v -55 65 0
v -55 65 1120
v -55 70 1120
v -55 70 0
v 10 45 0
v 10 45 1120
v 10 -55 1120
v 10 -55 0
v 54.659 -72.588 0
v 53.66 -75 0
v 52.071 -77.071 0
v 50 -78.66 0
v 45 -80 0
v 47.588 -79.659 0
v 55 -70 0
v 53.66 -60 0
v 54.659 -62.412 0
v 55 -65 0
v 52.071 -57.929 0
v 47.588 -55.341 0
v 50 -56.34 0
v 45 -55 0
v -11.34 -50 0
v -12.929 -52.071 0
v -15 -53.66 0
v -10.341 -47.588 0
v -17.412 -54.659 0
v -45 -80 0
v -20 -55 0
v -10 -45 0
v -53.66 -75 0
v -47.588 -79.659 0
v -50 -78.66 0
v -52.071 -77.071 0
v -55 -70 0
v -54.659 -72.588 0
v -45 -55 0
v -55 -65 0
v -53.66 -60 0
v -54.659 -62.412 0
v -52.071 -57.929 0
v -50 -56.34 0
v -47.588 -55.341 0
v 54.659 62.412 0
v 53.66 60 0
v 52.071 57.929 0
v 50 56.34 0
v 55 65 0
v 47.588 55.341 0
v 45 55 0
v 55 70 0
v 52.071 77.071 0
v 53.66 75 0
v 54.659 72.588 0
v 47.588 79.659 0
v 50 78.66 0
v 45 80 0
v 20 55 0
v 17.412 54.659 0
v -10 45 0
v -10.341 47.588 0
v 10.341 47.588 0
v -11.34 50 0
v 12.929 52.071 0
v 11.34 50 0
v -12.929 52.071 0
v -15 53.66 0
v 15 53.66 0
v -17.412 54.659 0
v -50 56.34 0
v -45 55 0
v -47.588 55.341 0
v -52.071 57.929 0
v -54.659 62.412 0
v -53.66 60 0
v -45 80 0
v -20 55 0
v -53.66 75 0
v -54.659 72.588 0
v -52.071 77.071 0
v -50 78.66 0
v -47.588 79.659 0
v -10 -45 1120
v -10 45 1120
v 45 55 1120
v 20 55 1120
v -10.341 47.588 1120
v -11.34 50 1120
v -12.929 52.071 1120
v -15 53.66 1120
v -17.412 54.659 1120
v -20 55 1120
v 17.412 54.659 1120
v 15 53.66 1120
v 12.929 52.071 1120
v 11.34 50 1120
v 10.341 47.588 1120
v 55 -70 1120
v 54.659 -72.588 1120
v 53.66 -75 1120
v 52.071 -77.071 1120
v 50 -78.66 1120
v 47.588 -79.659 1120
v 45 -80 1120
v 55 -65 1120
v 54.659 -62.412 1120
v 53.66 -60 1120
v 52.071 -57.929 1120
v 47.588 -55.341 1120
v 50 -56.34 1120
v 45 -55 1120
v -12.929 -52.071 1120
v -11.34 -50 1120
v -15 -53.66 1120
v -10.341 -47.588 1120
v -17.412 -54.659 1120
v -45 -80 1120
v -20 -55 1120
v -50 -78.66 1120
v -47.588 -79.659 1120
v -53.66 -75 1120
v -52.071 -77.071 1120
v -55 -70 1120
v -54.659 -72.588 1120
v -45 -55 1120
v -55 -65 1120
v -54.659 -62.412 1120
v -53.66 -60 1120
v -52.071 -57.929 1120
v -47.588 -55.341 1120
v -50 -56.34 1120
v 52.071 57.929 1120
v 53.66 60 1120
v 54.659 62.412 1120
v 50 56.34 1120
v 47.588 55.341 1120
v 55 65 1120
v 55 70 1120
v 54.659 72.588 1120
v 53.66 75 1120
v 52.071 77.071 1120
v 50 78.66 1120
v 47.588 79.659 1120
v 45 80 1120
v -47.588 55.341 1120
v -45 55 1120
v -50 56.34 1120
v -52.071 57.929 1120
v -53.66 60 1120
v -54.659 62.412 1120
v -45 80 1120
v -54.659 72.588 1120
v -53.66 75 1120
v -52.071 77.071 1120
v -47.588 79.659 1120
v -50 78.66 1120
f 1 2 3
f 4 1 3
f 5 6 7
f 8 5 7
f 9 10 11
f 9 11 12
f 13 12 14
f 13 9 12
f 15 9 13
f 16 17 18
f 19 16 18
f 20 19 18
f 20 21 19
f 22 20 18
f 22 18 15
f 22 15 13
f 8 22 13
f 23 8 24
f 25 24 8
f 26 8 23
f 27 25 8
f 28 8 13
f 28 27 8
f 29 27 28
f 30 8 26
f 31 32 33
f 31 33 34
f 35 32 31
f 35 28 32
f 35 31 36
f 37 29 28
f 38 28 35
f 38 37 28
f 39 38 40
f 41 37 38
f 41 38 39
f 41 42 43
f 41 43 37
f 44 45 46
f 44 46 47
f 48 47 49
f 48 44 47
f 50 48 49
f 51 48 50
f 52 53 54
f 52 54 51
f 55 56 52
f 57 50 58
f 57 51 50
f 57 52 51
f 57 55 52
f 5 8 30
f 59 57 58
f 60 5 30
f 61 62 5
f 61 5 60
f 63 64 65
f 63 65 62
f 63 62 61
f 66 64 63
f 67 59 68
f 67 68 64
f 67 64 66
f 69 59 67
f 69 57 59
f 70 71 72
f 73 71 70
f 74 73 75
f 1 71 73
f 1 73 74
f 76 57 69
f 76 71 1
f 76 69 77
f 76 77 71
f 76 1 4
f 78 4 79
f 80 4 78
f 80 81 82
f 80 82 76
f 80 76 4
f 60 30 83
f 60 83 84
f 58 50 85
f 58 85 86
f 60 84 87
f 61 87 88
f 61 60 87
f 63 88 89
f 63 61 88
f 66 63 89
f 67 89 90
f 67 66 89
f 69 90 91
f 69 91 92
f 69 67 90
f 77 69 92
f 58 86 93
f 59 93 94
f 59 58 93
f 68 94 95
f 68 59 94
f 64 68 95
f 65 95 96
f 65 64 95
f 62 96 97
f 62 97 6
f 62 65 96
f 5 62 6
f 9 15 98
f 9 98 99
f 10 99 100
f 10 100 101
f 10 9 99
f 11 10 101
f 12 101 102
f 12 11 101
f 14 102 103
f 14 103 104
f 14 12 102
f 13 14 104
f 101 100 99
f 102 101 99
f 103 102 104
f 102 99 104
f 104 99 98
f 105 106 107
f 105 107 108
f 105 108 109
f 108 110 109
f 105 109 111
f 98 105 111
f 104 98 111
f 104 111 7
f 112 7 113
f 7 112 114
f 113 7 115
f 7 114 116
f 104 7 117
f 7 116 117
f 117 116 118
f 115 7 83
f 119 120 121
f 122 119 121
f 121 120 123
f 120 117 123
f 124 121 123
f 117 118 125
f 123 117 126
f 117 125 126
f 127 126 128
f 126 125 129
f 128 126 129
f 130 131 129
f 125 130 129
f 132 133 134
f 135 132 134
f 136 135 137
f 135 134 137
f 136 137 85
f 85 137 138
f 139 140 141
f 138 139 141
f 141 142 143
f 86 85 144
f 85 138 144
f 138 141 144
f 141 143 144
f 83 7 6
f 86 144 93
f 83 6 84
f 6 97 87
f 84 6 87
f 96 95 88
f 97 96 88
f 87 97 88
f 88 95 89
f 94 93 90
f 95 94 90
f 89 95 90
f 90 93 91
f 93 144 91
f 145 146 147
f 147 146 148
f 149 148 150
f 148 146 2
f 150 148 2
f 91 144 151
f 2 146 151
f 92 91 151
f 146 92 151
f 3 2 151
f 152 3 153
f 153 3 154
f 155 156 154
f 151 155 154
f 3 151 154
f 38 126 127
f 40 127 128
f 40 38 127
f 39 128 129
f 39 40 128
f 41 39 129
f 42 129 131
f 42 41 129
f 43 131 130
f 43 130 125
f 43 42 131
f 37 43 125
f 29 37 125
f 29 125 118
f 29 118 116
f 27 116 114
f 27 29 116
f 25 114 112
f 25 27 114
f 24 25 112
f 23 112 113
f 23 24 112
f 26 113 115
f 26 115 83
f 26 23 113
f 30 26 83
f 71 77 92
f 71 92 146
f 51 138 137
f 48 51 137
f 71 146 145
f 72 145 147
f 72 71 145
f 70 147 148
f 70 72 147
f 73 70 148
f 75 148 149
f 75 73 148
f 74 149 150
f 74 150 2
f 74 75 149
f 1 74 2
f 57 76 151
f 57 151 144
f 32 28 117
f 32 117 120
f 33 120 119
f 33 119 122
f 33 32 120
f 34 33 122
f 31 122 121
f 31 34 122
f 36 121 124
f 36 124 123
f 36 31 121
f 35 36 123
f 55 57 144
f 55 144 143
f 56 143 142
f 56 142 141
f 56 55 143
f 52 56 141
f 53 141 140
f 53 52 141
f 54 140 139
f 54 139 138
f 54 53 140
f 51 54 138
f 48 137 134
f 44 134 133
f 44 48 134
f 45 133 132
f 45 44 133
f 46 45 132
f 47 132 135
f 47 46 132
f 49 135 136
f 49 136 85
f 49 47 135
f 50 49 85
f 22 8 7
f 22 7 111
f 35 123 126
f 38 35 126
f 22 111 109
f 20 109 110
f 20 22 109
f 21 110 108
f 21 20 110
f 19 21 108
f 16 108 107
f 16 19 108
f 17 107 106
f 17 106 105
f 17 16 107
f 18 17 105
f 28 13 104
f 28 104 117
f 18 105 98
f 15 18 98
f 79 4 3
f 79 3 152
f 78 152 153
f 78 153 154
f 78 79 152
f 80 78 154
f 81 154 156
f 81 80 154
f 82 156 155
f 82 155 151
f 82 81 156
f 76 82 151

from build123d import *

# Parameters (mm, degrees)
BOSS_EXTRUDE1_DEPTH = 1120


with BuildPart() as part:
    # Sketch1 → Boss-Extrude1 (new body)
    with BuildSketch(Plane.XY):
        with BuildLine():
            Line((-45, 80), (45, 80))
            ThreePointArc((45, 80), (52.071067812, 77.071067812), (55, 70))
            Line((55, 70), (55, 65))
            ThreePointArc((55, 65), (52.071067812, 57.928932188), (45, 55))
            Line((45, 55), (20, 55))
            ThreePointArc((20, 55), (12.928932188, 52.071067812), (10, 45))
            Line((10, 45), (10, -55))
            Line((10, -55), (45, -55))
            ThreePointArc((45, -55), (52.071067812, -57.928932188), (55, -65))
            Line((55, -65), (55, -70))
            ThreePointArc((55, -70), (52.071067812, -77.071067812), (45, -80))
            Line((45, -80), (-45, -80))
            ThreePointArc((-45, -80), (-52.071067812, -77.071067812), (-55, -70))
            Line((-55, -70), (-55, -65))
            ThreePointArc((-55, -65), (-52.071067812, -57.928932188), (-45, -55))
            Line((-45, -55), (-20, -55))
            ThreePointArc((-20, -55), (-12.928932188, -52.071067812), (-10, -45))
            Line((-10, -45), (-10, 45))
            ThreePointArc((-10, 45), (-12.928932188, 52.071067812), (-20, 55))
            Line((-20, 55), (-45, 55))
            ThreePointArc((-45, 55), (-52.071067812, 57.928932188), (-55, 65))
            Line((-55, 65), (-55, 70))
            ThreePointArc((-55, 70), (-52.071067812, 77.071067812), (-45, 80))
        make_face()
    extrude(amount=BOSS_EXTRUDE1_DEPTH)


solid = part.part
